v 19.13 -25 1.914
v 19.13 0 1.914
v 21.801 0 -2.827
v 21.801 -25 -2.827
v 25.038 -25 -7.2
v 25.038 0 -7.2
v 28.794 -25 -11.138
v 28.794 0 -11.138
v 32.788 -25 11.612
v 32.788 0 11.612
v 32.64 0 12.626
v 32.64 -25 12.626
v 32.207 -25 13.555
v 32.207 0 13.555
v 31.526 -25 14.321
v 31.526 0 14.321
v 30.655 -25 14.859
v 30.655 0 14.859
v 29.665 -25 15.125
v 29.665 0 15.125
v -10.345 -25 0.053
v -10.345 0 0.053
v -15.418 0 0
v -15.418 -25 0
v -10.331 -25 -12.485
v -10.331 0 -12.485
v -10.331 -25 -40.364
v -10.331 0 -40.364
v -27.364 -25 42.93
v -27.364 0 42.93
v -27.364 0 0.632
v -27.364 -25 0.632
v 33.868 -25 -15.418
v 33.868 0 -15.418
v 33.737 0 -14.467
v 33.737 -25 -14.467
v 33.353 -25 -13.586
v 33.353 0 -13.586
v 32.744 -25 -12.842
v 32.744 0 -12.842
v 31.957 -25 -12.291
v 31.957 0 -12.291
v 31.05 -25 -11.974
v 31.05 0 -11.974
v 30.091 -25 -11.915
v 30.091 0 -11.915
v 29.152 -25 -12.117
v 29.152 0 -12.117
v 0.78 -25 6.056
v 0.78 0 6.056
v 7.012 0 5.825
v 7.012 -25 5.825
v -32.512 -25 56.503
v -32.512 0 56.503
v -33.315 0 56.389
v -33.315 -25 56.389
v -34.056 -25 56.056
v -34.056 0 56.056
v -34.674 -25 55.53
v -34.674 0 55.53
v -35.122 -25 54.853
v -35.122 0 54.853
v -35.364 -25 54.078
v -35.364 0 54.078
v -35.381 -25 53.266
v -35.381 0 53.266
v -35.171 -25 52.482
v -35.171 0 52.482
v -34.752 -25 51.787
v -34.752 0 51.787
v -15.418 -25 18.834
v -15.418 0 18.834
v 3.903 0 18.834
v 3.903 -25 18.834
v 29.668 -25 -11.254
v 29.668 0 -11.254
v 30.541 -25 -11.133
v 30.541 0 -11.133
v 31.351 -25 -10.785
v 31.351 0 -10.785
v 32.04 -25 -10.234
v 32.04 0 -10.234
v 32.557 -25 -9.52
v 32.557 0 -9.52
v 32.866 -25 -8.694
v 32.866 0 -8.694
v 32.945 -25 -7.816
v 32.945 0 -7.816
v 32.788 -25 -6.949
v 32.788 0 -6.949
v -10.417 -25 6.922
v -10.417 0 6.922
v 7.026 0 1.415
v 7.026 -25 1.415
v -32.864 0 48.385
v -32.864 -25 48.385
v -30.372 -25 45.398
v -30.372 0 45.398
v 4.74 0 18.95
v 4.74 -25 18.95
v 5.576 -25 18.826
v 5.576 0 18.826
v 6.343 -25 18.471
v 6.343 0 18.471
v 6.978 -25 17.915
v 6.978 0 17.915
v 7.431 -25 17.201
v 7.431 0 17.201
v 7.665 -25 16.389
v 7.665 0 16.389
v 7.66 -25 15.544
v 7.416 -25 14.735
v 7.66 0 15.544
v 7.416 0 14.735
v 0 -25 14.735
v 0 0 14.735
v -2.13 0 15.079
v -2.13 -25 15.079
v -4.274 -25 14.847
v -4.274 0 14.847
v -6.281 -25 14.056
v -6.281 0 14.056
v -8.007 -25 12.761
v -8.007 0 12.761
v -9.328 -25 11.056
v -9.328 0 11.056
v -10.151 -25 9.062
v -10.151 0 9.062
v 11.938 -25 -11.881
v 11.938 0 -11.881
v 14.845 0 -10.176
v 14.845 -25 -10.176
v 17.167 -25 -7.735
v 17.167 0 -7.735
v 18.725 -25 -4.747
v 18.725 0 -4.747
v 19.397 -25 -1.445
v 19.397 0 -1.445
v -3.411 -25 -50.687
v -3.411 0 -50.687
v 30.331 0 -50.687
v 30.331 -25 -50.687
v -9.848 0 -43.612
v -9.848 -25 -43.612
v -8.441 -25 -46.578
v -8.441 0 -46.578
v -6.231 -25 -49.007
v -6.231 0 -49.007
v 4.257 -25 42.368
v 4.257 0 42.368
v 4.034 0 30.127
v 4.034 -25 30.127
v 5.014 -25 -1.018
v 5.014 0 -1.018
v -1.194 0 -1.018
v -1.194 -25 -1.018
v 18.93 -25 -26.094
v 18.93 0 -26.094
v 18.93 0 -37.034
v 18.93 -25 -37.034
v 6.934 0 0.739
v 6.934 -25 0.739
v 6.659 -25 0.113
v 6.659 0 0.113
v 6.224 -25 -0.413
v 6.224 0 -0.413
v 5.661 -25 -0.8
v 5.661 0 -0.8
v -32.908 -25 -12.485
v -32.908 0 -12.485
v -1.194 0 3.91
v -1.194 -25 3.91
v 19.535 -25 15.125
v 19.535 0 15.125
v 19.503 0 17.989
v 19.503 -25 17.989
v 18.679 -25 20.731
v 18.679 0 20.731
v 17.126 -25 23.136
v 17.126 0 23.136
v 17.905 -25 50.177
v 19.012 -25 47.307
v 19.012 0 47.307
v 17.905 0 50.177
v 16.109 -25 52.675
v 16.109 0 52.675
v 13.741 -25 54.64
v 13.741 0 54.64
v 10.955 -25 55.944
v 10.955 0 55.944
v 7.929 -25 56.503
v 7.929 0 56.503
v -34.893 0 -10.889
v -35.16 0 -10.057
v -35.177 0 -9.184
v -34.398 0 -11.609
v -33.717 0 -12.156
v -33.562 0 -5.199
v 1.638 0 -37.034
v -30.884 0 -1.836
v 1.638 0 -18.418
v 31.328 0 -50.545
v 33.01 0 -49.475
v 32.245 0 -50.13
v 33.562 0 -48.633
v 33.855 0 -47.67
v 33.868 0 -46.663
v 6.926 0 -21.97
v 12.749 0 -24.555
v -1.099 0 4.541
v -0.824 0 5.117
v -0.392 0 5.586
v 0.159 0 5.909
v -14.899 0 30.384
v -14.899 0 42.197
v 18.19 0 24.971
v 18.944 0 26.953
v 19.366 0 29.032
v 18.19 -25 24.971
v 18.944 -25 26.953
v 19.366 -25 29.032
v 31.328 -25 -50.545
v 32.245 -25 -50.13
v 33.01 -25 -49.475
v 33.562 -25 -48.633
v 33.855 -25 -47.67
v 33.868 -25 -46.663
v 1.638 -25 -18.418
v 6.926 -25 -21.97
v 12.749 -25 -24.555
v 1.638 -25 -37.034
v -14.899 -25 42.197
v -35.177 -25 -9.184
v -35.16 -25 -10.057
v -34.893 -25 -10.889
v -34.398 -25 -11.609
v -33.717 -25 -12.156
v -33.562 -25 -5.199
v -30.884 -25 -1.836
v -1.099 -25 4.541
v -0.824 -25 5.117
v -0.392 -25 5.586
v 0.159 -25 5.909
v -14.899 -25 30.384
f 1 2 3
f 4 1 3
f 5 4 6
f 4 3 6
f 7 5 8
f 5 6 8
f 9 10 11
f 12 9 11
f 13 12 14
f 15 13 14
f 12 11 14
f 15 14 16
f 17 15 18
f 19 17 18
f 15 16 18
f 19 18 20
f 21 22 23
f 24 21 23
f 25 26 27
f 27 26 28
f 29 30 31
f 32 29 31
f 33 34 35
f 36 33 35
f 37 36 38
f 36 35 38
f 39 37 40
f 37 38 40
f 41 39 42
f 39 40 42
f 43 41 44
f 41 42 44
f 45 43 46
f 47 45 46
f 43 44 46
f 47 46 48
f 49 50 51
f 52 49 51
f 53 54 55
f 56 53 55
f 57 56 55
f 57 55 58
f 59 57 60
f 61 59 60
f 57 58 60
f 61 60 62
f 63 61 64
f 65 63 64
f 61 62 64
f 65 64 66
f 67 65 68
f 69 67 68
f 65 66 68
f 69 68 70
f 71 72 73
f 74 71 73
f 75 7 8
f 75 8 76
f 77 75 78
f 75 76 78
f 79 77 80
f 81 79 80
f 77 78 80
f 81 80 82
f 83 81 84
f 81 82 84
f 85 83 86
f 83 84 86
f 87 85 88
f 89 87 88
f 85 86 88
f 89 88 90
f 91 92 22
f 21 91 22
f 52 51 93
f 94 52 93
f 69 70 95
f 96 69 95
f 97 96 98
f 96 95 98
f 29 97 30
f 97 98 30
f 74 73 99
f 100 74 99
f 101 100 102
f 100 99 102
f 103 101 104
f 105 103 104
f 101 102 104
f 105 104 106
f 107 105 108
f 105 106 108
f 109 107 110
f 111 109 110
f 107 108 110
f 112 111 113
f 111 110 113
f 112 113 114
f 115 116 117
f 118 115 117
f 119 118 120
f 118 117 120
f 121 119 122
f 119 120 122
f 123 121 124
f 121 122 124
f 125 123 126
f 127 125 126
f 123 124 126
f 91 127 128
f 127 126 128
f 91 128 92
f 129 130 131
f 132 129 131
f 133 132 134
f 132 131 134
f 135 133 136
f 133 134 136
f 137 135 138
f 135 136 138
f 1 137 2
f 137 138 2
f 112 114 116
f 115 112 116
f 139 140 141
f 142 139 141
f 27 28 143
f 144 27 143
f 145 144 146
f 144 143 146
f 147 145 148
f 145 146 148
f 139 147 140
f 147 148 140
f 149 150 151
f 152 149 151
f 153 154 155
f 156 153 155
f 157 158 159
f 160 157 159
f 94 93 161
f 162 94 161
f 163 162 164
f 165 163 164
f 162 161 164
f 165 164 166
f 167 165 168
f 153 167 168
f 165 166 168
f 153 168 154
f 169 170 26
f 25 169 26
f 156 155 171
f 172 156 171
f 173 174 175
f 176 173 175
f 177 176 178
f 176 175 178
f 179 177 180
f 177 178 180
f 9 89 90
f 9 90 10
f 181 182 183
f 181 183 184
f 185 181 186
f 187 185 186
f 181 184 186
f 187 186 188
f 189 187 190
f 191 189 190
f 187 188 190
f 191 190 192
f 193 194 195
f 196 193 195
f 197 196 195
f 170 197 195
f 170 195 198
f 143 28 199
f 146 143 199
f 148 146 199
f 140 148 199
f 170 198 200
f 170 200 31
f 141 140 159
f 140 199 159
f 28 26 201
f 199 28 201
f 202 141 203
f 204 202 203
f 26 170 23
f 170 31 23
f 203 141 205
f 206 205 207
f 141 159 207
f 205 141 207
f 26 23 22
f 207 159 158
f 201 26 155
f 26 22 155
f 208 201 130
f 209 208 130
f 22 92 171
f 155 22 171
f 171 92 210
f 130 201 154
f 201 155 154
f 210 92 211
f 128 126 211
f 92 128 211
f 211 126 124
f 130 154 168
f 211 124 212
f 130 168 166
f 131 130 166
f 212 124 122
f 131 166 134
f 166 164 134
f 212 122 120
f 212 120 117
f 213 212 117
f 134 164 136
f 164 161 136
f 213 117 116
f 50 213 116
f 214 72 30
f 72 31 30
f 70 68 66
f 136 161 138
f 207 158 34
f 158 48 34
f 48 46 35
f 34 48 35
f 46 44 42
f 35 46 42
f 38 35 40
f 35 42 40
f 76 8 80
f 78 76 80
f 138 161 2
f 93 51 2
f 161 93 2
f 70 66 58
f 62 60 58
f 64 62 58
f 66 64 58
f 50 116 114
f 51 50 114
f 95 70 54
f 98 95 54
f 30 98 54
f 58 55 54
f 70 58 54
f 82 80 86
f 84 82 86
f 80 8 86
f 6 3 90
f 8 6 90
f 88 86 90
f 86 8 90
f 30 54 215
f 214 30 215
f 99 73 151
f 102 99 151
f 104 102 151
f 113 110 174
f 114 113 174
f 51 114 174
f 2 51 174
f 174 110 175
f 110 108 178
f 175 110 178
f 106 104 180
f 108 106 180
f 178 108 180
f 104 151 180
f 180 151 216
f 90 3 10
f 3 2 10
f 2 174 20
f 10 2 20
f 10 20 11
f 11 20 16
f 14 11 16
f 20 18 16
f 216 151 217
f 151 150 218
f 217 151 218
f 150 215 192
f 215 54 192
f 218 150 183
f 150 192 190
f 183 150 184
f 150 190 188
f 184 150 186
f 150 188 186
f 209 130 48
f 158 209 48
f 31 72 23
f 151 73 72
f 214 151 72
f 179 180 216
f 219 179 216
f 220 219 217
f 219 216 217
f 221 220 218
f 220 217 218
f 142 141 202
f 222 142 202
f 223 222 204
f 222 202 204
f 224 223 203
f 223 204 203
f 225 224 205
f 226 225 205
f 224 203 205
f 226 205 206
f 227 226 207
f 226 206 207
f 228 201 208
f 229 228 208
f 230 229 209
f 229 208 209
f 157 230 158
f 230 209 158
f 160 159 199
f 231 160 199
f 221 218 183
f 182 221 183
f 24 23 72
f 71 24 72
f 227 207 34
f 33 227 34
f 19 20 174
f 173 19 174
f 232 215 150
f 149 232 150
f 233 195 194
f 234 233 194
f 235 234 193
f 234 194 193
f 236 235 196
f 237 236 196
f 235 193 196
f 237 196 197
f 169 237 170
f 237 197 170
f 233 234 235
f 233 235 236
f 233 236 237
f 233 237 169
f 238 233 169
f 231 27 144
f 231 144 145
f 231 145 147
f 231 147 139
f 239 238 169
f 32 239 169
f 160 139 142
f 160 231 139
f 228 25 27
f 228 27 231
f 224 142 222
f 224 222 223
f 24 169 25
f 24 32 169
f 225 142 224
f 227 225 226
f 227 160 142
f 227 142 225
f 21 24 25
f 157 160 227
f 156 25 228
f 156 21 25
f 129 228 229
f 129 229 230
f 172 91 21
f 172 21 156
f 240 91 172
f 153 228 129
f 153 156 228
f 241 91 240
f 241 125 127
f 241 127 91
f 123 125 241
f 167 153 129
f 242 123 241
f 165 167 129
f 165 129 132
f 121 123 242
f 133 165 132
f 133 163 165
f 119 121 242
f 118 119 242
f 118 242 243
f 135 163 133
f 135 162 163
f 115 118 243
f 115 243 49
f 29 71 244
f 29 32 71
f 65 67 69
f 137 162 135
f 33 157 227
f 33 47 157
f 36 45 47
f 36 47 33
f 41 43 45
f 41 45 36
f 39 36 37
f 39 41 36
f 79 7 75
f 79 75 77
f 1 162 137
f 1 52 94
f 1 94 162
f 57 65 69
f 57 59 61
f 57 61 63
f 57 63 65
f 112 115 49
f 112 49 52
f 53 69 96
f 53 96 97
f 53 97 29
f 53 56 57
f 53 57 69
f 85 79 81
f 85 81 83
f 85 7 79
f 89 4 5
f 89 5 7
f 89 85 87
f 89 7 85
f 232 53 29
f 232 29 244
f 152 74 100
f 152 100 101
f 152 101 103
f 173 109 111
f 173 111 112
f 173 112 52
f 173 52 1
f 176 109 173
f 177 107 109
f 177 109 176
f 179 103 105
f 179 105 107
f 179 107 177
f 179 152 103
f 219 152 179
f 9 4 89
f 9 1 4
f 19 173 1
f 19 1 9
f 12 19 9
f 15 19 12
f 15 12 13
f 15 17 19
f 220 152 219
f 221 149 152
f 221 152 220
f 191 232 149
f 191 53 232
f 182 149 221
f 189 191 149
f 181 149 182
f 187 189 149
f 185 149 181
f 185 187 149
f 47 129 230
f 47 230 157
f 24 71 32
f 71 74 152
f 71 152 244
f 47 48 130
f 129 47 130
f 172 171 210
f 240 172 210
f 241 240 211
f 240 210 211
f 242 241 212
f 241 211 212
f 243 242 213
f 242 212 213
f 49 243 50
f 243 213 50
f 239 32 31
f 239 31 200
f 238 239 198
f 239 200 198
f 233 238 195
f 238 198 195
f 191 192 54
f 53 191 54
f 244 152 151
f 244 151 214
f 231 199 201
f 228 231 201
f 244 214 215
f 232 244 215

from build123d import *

# Parameters (mm, degrees)
F1_DEPTH = 15
F2_DEPTH = 2.5
F3_DEPTH = 25


with BuildPart() as f1:
    # F0 (on Front) → F1 (new body)
    with BuildSketch(Plane.XZ):
        with BuildLine():
            ThreePointArc((-34.751754, 51.786974), (-31.688129, 46.832693), (-27.364016, 42.92978))
            Line((-27.364016, 42.92978), (-27.364016, 0.631911))
            ThreePointArc((-27.364016, 0.631911), (-32.344059, -3.421449), (-35.177484, -9.18359))
            ThreePointArc((-35.177484, -9.18359), (-34.671706, -11.266714), (-32.907836, -12.4849))
            Line((-32.907836, -12.4849), (-10.331013, -12.4849))
            Line((-10.331013, -12.4849), (-10.331013, -40.363941))
            ThreePointArc((-10.331013, -40.363941), (-8.440878, -46.57815), (-3.410706, -50.687455))
            Line((-3.410706, -50.687455), (30.331215, -50.687455))
            ThreePointArc((30.331215, -50.687455), (33.010256, -49.475316), (33.868331, -46.6628))
            Line((33.868331, -46.6628), (33.868331, -15.41826))
            ThreePointArc((33.868331, -15.41826), (32.369677, -12.53986), (29.152177, -12.116951))
            Line((29.152177, -12.116951), (11.938204, -11.881143))
            ThreePointArc((11.938204, -11.881143), (18.050529, -6.295658), (19.130344, 1.913616))
            ThreePointArc((19.130344, 1.913616), (23.351533, -5.064206), (28.793937, -11.137811))
            ThreePointArc((28.793937, -11.137811), (32.039808, -10.233968), (32.788105, -6.948748))
            Line((32.788105, -6.948748), (32.788105, 11.612454))
            ThreePointArc((32.788105, 11.612454), (31.89459, 13.962579), (29.665431, 15.125466))
            Line((29.665431, 15.125466), (19.534895, 15.125466))
            ThreePointArc((19.534895, 15.125466), (19.187726, 19.388686), (17.125975, 23.13632))
            ThreePointArc((17.125975, 23.13632), (18.607422, 25.946601), (19.366147, 29.031517))
            Line((19.366147, 29.031517), (19.012436, 47.306627))
            ThreePointArc((19.012436, 47.306627), (14.987699, 53.732755), (7.929467, 56.503132))
            Line((7.929467, 56.503132), (-32.511577, 56.503132))
            ThreePointArc((-32.511577, 56.503132), (-35.122158, 54.853038), (-34.751754, 51.786974))
        make_face()
        with BuildLine():
            Line((1.638178, -37.033778), (1.638178, -18.418202))
            ThreePointArc((1.638178, -18.418202), (9.7814, -23.388924), (18.930372, -26.09382))
            Line((18.930372, -26.09382), (18.930372, -37.033778))
            Line((18.930372, -37.033778), (1.638178, -37.033778))
        make_face(mode=Mode.SUBTRACT)
        with BuildLine():
            Line((0.779622, 6.056475), (7.012051, 5.82512))
            Line((7.012051, 5.82512), (7.025873, 1.415433))
            ThreePointArc((7.025873, 1.415433), (6.459904, -0.16527), (5.013869, -1.018453))
            Line((5.013869, -1.018453), (-1.193664, -1.018453))
            Line((-1.193664, -1.018453), (-1.193664, 3.909603))
            ThreePointArc((-1.193664, 3.909603), (-0.625401, 5.367591), (0.779622, 6.056475))
        make_face(mode=Mode.SUBTRACT)
        with BuildLine():
            Line((-15.418217, 0), (-15.418217, 18.833645))
            Line((-15.418217, 18.833645), (3.903346, 18.833645))
            ThreePointArc((3.903346, 18.833645), (6.97837, 17.914546), (7.416358, 14.735131))
            Line((7.416358, 14.735131), (0, 14.735131))
            ThreePointArc((0, 14.735131), (-7.187256, 13.466433), (-10.416982, 6.921578))
            Line((-10.416982, 6.921578), (-10.345434, 0.052841))
            Line((-10.345434, 0.052841), (-15.418217, 0))
        make_face(mode=Mode.SUBTRACT)
        Polygon((-14.898672, 30.383811), (-14.898672, 42.196874), (4.256723, 42.367905), (4.034158, 30.126804), align=None, mode=Mode.SUBTRACT)
    extrude(amount=F1_DEPTH)

    # F0 (on Front) → F2 (cut, symmetric)
    with BuildSketch(Plane.XZ):
        with BuildLine():
            ThreePointArc((-34.751754, 51.786974), (-31.688129, 46.832693), (-27.364016, 42.92978))
            Line((-27.364016, 42.92978), (-27.364016, 0.631911))
            ThreePointArc((-27.364016, 0.631911), (-32.344059, -3.421449), (-35.177484, -9.18359))
            ThreePointArc((-35.177484, -9.18359), (-34.671706, -11.266714), (-32.907836, -12.4849))
            Line((-32.907836, -12.4849), (-10.331013, -12.4849))
            Line((-10.331013, -12.4849), (-10.331013, -40.363941))
            ThreePointArc((-10.331013, -40.363941), (-8.440878, -46.57815), (-3.410706, -50.687455))
            Line((-3.410706, -50.687455), (30.331215, -50.687455))
            ThreePointArc((30.331215, -50.687455), (33.010256, -49.475316), (33.868331, -46.6628))
            Line((33.868331, -46.6628), (33.868331, -15.41826))
            ThreePointArc((33.868331, -15.41826), (32.369677, -12.53986), (29.152177, -12.116951))
            Line((29.152177, -12.116951), (11.938204, -11.881143))
            ThreePointArc((11.938204, -11.881143), (18.050529, -6.295658), (19.130344, 1.913616))
            ThreePointArc((19.130344, 1.913616), (23.351533, -5.064206), (28.793937, -11.137811))
            ThreePointArc((28.793937, -11.137811), (32.039808, -10.233968), (32.788105, -6.948748))
            Line((32.788105, -6.948748), (32.788105, 11.612454))
            ThreePointArc((32.788105, 11.612454), (31.89459, 13.962579), (29.665431, 15.125466))
            Line((29.665431, 15.125466), (19.534895, 15.125466))
            ThreePointArc((19.534895, 15.125466), (19.187726, 19.388686), (17.125975, 23.13632))
            ThreePointArc((17.125975, 23.13632), (18.607422, 25.946601), (19.366147, 29.031517))
            Line((19.366147, 29.031517), (19.012436, 47.306627))
            ThreePointArc((19.012436, 47.306627), (14.987699, 53.732755), (7.929467, 56.503132))
            Line((7.929467, 56.503132), (-32.511577, 56.503132))
            ThreePointArc((-32.511577, 56.503132), (-35.122158, 54.853038), (-34.751754, 51.786974))
        make_face()
        with BuildLine():
            Line((1.638178, -37.033778), (1.638178, -18.418202))
            ThreePointArc((1.638178, -18.418202), (9.7814, -23.388924), (18.930372, -26.09382))
            Line((18.930372, -26.09382), (18.930372, -37.033778))
            Line((18.930372, -37.033778), (1.638178, -37.033778))
        make_face(mode=Mode.SUBTRACT)
        with BuildLine():
            Line((0.779622, 6.056475), (7.012051, 5.82512))
            Line((7.012051, 5.82512), (7.025873, 1.415433))
            ThreePointArc((7.025873, 1.415433), (6.459904, -0.16527), (5.013869, -1.018453))
            Line((5.013869, -1.018453), (-1.193664, -1.018453))
            Line((-1.193664, -1.018453), (-1.193664, 3.909603))
            ThreePointArc((-1.193664, 3.909603), (-0.625401, 5.367591), (0.779622, 6.056475))
        make_face(mode=Mode.SUBTRACT)
        with BuildLine():
            Line((-15.418217, 0), (-15.418217, 18.833645))
            Line((-15.418217, 18.833645), (3.903346, 18.833645))
            ThreePointArc((3.903346, 18.833645), (6.97837, 17.914546), (7.416358, 14.735131))
            Line((7.416358, 14.735131), (0, 14.735131))
            ThreePointArc((0, 14.735131), (-7.187256, 13.466433), (-10.416982, 6.921578))
            Line((-10.416982, 6.921578), (-10.345434, 0.052841))
            Line((-10.345434, 0.052841), (-15.418217, 0))
        make_face(mode=Mode.SUBTRACT)
        Polygon((-14.898672, 30.383811), (-14.898672, 42.196874), (4.256723, 42.367905), (4.034158, 30.126804), align=None, mode=Mode.SUBTRACT)
    extrude(amount=F2_DEPTH, both=True, mode=Mode.SUBTRACT)

    # F0 (on Front) → F3 (join)
    with BuildSketch(Plane.XZ):
        with BuildLine():
            ThreePointArc((-34.751754, 51.786974), (-31.688129, 46.832693), (-27.364016, 42.92978))
            Line((-27.364016, 42.92978), (-27.364016, 0.631911))
            ThreePointArc((-27.364016, 0.631911), (-32.344059, -3.421449), (-35.177484, -9.18359))
            ThreePointArc((-35.177484, -9.18359), (-34.671706, -11.266714), (-32.907836, -12.4849))
            Line((-32.907836, -12.4849), (-10.331013, -12.4849))
            Line((-10.331013, -12.4849), (-10.331013, -40.363941))
            ThreePointArc((-10.331013, -40.363941), (-8.440878, -46.57815), (-3.410706, -50.687455))
            Line((-3.410706, -50.687455), (30.331215, -50.687455))
            ThreePointArc((30.331215, -50.687455), (33.010256, -49.475316), (33.868331, -46.6628))
            Line((33.868331, -46.6628), (33.868331, -15.41826))
            ThreePointArc((33.868331, -15.41826), (32.369677, -12.53986), (29.152177, -12.116951))
            Line((29.152177, -12.116951), (11.938204, -11.881143))
            ThreePointArc((11.938204, -11.881143), (18.050529, -6.295658), (19.130344, 1.913616))
            ThreePointArc((19.130344, 1.913616), (23.351533, -5.064206), (28.793937, -11.137811))
            ThreePointArc((28.793937, -11.137811), (32.039808, -10.233968), (32.788105, -6.948748))
            Line((32.788105, -6.948748), (32.788105, 11.612454))
            ThreePointArc((32.788105, 11.612454), (31.89459, 13.962579), (29.665431, 15.125466))
            Line((29.665431, 15.125466), (19.534895, 15.125466))
            ThreePointArc((19.534895, 15.125466), (19.187726, 19.388686), (17.125975, 23.13632))
            ThreePointArc((17.125975, 23.13632), (18.607422, 25.946601), (19.366147, 29.031517))
            Line((19.366147, 29.031517), (19.012436, 47.306627))
            ThreePointArc((19.012436, 47.306627), (14.987699, 53.732755), (7.929467, 56.503132))
            Line((7.929467, 56.503132), (-32.511577, 56.503132))
            ThreePointArc((-32.511577, 56.503132), (-35.122158, 54.853038), (-34.751754, 51.786974))
        make_face()
        with BuildLine():
            Line((1.638178, -37.033778), (1.638178, -18.418202))
            ThreePointArc((1.638178, -18.418202), (9.7814, -23.388924), (18.930372, -26.09382))
            Line((18.930372, -26.09382), (18.930372, -37.033778))
            Line((18.930372, -37.033778), (1.638178, -37.033778))
        make_face(mode=Mode.SUBTRACT)
        with BuildLine():
            Line((0.779622, 6.056475), (7.012051, 5.82512))
            Line((7.012051, 5.82512), (7.025873, 1.415433))
            ThreePointArc((7.025873, 1.415433), (6.459904, -0.16527), (5.013869, -1.018453))
            Line((5.013869, -1.018453), (-1.193664, -1.018453))
            Line((-1.193664, -1.018453), (-1.193664, 3.909603))
            ThreePointArc((-1.193664, 3.909603), (-0.625401, 5.367591), (0.779622, 6.056475))
        make_face(mode=Mode.SUBTRACT)
        with BuildLine():
            Line((-15.418217, 0), (-15.418217, 18.833645))
            Line((-15.418217, 18.833645), (3.903346, 18.833645))
            ThreePointArc((3.903346, 18.833645), (6.97837, 17.914546), (7.416358, 14.735131))
            Line((7.416358, 14.735131), (0, 14.735131))
            ThreePointArc((0, 14.735131), (-7.187256, 13.466433), (-10.416982, 6.921578))
            Line((-10.416982, 6.921578), (-10.345434, 0.052841))
            Line((-10.345434, 0.052841), (-15.418217, 0))
        make_face(mode=Mode.SUBTRACT)
        Polygon((-14.898672, 30.383811), (-14.898672, 42.196874), (4.256723, 42.367905), (4.034158, 30.126804), align=None, mode=Mode.SUBTRACT)
    extrude(amount=F3_DEPTH)


solid = f1.part
